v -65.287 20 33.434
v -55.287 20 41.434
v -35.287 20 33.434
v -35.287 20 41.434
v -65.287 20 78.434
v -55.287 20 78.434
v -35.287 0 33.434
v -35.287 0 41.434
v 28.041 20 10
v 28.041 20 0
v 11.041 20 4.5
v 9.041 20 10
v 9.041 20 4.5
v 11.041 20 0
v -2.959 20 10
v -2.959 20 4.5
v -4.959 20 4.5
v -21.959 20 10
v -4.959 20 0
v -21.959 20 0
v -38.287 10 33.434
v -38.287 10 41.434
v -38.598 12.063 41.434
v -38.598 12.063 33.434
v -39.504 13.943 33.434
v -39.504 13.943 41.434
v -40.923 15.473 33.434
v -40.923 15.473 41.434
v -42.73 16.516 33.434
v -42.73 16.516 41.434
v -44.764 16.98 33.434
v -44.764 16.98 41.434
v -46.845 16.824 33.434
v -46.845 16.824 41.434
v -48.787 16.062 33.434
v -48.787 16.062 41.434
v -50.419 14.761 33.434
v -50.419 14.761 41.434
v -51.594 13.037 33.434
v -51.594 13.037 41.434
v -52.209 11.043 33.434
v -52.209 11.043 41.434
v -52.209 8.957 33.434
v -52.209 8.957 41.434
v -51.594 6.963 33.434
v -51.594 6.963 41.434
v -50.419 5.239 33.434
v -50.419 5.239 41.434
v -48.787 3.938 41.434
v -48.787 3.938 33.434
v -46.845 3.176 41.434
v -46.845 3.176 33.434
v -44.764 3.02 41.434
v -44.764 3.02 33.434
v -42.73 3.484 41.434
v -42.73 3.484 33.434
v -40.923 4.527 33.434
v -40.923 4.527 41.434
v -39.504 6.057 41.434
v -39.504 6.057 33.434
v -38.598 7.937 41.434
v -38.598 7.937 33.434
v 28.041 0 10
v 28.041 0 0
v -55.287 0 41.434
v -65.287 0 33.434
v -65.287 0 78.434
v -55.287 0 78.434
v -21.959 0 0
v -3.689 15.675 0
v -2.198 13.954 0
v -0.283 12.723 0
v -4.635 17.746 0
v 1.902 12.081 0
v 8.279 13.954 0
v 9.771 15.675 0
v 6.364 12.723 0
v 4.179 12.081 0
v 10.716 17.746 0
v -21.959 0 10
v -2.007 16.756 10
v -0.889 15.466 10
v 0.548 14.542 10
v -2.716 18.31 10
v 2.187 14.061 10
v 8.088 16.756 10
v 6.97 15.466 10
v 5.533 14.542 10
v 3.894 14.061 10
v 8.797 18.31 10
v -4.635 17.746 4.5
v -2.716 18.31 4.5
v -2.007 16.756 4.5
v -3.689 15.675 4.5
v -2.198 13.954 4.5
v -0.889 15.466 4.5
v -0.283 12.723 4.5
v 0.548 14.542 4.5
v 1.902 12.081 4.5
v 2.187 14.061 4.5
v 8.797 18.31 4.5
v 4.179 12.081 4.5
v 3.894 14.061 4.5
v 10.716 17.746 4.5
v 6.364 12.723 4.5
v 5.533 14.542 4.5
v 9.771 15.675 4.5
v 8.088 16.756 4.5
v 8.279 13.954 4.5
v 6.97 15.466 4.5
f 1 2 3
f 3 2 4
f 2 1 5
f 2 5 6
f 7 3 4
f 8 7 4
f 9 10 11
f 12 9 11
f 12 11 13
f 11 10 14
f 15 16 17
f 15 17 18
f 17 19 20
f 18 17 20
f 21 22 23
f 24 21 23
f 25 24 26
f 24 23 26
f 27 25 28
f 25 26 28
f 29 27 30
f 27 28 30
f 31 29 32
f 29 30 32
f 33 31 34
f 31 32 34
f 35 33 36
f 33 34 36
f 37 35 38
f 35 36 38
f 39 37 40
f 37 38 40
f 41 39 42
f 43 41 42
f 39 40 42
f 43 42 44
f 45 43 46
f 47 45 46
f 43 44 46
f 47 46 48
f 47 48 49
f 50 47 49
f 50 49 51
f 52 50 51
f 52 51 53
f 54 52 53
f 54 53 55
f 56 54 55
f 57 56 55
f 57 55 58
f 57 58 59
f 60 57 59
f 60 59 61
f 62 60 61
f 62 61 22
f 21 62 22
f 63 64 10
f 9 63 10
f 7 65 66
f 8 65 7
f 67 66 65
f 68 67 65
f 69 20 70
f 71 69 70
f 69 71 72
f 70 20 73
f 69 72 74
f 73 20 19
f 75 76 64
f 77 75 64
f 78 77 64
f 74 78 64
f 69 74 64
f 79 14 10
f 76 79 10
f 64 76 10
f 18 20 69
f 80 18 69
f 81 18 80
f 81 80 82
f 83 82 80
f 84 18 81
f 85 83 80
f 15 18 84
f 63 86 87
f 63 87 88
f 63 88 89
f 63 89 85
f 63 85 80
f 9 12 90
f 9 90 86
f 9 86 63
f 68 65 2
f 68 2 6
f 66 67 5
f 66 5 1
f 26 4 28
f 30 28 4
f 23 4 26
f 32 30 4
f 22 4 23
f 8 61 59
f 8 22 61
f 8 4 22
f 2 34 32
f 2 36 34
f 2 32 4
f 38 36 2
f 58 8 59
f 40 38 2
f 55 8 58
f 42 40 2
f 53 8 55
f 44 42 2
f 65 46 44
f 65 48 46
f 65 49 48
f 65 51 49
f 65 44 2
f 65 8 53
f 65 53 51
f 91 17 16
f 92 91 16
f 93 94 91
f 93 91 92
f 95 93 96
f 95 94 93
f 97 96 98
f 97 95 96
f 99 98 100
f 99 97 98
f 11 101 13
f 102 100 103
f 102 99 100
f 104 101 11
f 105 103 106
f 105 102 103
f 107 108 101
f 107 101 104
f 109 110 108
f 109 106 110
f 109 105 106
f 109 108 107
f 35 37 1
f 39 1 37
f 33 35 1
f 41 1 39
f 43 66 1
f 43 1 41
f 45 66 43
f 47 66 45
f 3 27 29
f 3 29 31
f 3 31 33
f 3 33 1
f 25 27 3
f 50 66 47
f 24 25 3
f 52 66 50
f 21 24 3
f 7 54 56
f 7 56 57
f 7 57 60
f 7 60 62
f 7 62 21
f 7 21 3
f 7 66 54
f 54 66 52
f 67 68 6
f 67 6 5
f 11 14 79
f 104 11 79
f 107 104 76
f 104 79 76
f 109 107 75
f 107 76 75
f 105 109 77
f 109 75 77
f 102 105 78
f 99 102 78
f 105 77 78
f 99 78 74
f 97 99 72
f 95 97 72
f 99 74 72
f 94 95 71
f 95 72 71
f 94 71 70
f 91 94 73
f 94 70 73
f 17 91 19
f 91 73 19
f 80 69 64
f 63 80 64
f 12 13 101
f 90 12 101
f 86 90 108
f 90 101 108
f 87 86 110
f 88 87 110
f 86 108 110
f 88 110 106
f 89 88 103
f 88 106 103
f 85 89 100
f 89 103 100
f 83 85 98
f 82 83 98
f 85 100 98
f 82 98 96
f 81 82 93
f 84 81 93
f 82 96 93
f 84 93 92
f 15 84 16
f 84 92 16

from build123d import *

# Parameters (mm, degrees)
F1_DEPTH = 10
F3_DEPTH = 4.5
F5_DEPTH = 20
F6_R     = 7
F7_DEPTH = 25


with BuildPart() as f1:
    # F0 (on Top) → F1 (new body)
    with BuildSketch(Plane.XY):
        with BuildLine():
            Line((-2.959461, 20), (-21.959461, 20))
            Line((-21.959461, 20), (-21.959461, 0))
            Line((-21.959461, 0), (28.040539, 0))
            Line((28.040539, 0), (28.040539, 20))
            Line((28.040539, 20), (9.040539, 20))
            ThreePointArc((9.040539, 20), (3.040539, 14), (-2.959461, 20))
        make_face()
    extrude(amount=F1_DEPTH)

    # F2 (on face) → F3 (cut)
    with BuildSketch(Plane(origin=(0, 0, 0), x_dir=(1, 0, 0), z_dir=(0, 0, -1))):
        with BuildLine():
            Line((-4.959461, -20), (11.040539, -20))
            ThreePointArc((11.040539, -20), (3.040539, -12), (-4.959461, -20))
        make_face()
    extrude(amount=-F3_DEPTH, mode=Mode.SUBTRACT)


with BuildPart() as f5:
    # F4 (on Front) → F5 (new body)
    with BuildSketch(Plane.XZ):
        Polygon((-55.287454, 78.434325), (-65.287454, 78.434325), (-65.287454, 33.434325), (-35.287454, 33.434325), (-35.287454, 41.434325), (-55.287454, 41.434325), align=None)
    extrude(amount=-F5_DEPTH)

    # F6 (on face) → F7 (cut)
    with BuildSketch(Plane.XY.offset(41.434325)):
        with Locations((-45.287454, 10)):
            Circle(F6_R)
    extrude(amount=-F7_DEPTH, mode=Mode.SUBTRACT)


solid = Compound([f1.part, f5.part])
